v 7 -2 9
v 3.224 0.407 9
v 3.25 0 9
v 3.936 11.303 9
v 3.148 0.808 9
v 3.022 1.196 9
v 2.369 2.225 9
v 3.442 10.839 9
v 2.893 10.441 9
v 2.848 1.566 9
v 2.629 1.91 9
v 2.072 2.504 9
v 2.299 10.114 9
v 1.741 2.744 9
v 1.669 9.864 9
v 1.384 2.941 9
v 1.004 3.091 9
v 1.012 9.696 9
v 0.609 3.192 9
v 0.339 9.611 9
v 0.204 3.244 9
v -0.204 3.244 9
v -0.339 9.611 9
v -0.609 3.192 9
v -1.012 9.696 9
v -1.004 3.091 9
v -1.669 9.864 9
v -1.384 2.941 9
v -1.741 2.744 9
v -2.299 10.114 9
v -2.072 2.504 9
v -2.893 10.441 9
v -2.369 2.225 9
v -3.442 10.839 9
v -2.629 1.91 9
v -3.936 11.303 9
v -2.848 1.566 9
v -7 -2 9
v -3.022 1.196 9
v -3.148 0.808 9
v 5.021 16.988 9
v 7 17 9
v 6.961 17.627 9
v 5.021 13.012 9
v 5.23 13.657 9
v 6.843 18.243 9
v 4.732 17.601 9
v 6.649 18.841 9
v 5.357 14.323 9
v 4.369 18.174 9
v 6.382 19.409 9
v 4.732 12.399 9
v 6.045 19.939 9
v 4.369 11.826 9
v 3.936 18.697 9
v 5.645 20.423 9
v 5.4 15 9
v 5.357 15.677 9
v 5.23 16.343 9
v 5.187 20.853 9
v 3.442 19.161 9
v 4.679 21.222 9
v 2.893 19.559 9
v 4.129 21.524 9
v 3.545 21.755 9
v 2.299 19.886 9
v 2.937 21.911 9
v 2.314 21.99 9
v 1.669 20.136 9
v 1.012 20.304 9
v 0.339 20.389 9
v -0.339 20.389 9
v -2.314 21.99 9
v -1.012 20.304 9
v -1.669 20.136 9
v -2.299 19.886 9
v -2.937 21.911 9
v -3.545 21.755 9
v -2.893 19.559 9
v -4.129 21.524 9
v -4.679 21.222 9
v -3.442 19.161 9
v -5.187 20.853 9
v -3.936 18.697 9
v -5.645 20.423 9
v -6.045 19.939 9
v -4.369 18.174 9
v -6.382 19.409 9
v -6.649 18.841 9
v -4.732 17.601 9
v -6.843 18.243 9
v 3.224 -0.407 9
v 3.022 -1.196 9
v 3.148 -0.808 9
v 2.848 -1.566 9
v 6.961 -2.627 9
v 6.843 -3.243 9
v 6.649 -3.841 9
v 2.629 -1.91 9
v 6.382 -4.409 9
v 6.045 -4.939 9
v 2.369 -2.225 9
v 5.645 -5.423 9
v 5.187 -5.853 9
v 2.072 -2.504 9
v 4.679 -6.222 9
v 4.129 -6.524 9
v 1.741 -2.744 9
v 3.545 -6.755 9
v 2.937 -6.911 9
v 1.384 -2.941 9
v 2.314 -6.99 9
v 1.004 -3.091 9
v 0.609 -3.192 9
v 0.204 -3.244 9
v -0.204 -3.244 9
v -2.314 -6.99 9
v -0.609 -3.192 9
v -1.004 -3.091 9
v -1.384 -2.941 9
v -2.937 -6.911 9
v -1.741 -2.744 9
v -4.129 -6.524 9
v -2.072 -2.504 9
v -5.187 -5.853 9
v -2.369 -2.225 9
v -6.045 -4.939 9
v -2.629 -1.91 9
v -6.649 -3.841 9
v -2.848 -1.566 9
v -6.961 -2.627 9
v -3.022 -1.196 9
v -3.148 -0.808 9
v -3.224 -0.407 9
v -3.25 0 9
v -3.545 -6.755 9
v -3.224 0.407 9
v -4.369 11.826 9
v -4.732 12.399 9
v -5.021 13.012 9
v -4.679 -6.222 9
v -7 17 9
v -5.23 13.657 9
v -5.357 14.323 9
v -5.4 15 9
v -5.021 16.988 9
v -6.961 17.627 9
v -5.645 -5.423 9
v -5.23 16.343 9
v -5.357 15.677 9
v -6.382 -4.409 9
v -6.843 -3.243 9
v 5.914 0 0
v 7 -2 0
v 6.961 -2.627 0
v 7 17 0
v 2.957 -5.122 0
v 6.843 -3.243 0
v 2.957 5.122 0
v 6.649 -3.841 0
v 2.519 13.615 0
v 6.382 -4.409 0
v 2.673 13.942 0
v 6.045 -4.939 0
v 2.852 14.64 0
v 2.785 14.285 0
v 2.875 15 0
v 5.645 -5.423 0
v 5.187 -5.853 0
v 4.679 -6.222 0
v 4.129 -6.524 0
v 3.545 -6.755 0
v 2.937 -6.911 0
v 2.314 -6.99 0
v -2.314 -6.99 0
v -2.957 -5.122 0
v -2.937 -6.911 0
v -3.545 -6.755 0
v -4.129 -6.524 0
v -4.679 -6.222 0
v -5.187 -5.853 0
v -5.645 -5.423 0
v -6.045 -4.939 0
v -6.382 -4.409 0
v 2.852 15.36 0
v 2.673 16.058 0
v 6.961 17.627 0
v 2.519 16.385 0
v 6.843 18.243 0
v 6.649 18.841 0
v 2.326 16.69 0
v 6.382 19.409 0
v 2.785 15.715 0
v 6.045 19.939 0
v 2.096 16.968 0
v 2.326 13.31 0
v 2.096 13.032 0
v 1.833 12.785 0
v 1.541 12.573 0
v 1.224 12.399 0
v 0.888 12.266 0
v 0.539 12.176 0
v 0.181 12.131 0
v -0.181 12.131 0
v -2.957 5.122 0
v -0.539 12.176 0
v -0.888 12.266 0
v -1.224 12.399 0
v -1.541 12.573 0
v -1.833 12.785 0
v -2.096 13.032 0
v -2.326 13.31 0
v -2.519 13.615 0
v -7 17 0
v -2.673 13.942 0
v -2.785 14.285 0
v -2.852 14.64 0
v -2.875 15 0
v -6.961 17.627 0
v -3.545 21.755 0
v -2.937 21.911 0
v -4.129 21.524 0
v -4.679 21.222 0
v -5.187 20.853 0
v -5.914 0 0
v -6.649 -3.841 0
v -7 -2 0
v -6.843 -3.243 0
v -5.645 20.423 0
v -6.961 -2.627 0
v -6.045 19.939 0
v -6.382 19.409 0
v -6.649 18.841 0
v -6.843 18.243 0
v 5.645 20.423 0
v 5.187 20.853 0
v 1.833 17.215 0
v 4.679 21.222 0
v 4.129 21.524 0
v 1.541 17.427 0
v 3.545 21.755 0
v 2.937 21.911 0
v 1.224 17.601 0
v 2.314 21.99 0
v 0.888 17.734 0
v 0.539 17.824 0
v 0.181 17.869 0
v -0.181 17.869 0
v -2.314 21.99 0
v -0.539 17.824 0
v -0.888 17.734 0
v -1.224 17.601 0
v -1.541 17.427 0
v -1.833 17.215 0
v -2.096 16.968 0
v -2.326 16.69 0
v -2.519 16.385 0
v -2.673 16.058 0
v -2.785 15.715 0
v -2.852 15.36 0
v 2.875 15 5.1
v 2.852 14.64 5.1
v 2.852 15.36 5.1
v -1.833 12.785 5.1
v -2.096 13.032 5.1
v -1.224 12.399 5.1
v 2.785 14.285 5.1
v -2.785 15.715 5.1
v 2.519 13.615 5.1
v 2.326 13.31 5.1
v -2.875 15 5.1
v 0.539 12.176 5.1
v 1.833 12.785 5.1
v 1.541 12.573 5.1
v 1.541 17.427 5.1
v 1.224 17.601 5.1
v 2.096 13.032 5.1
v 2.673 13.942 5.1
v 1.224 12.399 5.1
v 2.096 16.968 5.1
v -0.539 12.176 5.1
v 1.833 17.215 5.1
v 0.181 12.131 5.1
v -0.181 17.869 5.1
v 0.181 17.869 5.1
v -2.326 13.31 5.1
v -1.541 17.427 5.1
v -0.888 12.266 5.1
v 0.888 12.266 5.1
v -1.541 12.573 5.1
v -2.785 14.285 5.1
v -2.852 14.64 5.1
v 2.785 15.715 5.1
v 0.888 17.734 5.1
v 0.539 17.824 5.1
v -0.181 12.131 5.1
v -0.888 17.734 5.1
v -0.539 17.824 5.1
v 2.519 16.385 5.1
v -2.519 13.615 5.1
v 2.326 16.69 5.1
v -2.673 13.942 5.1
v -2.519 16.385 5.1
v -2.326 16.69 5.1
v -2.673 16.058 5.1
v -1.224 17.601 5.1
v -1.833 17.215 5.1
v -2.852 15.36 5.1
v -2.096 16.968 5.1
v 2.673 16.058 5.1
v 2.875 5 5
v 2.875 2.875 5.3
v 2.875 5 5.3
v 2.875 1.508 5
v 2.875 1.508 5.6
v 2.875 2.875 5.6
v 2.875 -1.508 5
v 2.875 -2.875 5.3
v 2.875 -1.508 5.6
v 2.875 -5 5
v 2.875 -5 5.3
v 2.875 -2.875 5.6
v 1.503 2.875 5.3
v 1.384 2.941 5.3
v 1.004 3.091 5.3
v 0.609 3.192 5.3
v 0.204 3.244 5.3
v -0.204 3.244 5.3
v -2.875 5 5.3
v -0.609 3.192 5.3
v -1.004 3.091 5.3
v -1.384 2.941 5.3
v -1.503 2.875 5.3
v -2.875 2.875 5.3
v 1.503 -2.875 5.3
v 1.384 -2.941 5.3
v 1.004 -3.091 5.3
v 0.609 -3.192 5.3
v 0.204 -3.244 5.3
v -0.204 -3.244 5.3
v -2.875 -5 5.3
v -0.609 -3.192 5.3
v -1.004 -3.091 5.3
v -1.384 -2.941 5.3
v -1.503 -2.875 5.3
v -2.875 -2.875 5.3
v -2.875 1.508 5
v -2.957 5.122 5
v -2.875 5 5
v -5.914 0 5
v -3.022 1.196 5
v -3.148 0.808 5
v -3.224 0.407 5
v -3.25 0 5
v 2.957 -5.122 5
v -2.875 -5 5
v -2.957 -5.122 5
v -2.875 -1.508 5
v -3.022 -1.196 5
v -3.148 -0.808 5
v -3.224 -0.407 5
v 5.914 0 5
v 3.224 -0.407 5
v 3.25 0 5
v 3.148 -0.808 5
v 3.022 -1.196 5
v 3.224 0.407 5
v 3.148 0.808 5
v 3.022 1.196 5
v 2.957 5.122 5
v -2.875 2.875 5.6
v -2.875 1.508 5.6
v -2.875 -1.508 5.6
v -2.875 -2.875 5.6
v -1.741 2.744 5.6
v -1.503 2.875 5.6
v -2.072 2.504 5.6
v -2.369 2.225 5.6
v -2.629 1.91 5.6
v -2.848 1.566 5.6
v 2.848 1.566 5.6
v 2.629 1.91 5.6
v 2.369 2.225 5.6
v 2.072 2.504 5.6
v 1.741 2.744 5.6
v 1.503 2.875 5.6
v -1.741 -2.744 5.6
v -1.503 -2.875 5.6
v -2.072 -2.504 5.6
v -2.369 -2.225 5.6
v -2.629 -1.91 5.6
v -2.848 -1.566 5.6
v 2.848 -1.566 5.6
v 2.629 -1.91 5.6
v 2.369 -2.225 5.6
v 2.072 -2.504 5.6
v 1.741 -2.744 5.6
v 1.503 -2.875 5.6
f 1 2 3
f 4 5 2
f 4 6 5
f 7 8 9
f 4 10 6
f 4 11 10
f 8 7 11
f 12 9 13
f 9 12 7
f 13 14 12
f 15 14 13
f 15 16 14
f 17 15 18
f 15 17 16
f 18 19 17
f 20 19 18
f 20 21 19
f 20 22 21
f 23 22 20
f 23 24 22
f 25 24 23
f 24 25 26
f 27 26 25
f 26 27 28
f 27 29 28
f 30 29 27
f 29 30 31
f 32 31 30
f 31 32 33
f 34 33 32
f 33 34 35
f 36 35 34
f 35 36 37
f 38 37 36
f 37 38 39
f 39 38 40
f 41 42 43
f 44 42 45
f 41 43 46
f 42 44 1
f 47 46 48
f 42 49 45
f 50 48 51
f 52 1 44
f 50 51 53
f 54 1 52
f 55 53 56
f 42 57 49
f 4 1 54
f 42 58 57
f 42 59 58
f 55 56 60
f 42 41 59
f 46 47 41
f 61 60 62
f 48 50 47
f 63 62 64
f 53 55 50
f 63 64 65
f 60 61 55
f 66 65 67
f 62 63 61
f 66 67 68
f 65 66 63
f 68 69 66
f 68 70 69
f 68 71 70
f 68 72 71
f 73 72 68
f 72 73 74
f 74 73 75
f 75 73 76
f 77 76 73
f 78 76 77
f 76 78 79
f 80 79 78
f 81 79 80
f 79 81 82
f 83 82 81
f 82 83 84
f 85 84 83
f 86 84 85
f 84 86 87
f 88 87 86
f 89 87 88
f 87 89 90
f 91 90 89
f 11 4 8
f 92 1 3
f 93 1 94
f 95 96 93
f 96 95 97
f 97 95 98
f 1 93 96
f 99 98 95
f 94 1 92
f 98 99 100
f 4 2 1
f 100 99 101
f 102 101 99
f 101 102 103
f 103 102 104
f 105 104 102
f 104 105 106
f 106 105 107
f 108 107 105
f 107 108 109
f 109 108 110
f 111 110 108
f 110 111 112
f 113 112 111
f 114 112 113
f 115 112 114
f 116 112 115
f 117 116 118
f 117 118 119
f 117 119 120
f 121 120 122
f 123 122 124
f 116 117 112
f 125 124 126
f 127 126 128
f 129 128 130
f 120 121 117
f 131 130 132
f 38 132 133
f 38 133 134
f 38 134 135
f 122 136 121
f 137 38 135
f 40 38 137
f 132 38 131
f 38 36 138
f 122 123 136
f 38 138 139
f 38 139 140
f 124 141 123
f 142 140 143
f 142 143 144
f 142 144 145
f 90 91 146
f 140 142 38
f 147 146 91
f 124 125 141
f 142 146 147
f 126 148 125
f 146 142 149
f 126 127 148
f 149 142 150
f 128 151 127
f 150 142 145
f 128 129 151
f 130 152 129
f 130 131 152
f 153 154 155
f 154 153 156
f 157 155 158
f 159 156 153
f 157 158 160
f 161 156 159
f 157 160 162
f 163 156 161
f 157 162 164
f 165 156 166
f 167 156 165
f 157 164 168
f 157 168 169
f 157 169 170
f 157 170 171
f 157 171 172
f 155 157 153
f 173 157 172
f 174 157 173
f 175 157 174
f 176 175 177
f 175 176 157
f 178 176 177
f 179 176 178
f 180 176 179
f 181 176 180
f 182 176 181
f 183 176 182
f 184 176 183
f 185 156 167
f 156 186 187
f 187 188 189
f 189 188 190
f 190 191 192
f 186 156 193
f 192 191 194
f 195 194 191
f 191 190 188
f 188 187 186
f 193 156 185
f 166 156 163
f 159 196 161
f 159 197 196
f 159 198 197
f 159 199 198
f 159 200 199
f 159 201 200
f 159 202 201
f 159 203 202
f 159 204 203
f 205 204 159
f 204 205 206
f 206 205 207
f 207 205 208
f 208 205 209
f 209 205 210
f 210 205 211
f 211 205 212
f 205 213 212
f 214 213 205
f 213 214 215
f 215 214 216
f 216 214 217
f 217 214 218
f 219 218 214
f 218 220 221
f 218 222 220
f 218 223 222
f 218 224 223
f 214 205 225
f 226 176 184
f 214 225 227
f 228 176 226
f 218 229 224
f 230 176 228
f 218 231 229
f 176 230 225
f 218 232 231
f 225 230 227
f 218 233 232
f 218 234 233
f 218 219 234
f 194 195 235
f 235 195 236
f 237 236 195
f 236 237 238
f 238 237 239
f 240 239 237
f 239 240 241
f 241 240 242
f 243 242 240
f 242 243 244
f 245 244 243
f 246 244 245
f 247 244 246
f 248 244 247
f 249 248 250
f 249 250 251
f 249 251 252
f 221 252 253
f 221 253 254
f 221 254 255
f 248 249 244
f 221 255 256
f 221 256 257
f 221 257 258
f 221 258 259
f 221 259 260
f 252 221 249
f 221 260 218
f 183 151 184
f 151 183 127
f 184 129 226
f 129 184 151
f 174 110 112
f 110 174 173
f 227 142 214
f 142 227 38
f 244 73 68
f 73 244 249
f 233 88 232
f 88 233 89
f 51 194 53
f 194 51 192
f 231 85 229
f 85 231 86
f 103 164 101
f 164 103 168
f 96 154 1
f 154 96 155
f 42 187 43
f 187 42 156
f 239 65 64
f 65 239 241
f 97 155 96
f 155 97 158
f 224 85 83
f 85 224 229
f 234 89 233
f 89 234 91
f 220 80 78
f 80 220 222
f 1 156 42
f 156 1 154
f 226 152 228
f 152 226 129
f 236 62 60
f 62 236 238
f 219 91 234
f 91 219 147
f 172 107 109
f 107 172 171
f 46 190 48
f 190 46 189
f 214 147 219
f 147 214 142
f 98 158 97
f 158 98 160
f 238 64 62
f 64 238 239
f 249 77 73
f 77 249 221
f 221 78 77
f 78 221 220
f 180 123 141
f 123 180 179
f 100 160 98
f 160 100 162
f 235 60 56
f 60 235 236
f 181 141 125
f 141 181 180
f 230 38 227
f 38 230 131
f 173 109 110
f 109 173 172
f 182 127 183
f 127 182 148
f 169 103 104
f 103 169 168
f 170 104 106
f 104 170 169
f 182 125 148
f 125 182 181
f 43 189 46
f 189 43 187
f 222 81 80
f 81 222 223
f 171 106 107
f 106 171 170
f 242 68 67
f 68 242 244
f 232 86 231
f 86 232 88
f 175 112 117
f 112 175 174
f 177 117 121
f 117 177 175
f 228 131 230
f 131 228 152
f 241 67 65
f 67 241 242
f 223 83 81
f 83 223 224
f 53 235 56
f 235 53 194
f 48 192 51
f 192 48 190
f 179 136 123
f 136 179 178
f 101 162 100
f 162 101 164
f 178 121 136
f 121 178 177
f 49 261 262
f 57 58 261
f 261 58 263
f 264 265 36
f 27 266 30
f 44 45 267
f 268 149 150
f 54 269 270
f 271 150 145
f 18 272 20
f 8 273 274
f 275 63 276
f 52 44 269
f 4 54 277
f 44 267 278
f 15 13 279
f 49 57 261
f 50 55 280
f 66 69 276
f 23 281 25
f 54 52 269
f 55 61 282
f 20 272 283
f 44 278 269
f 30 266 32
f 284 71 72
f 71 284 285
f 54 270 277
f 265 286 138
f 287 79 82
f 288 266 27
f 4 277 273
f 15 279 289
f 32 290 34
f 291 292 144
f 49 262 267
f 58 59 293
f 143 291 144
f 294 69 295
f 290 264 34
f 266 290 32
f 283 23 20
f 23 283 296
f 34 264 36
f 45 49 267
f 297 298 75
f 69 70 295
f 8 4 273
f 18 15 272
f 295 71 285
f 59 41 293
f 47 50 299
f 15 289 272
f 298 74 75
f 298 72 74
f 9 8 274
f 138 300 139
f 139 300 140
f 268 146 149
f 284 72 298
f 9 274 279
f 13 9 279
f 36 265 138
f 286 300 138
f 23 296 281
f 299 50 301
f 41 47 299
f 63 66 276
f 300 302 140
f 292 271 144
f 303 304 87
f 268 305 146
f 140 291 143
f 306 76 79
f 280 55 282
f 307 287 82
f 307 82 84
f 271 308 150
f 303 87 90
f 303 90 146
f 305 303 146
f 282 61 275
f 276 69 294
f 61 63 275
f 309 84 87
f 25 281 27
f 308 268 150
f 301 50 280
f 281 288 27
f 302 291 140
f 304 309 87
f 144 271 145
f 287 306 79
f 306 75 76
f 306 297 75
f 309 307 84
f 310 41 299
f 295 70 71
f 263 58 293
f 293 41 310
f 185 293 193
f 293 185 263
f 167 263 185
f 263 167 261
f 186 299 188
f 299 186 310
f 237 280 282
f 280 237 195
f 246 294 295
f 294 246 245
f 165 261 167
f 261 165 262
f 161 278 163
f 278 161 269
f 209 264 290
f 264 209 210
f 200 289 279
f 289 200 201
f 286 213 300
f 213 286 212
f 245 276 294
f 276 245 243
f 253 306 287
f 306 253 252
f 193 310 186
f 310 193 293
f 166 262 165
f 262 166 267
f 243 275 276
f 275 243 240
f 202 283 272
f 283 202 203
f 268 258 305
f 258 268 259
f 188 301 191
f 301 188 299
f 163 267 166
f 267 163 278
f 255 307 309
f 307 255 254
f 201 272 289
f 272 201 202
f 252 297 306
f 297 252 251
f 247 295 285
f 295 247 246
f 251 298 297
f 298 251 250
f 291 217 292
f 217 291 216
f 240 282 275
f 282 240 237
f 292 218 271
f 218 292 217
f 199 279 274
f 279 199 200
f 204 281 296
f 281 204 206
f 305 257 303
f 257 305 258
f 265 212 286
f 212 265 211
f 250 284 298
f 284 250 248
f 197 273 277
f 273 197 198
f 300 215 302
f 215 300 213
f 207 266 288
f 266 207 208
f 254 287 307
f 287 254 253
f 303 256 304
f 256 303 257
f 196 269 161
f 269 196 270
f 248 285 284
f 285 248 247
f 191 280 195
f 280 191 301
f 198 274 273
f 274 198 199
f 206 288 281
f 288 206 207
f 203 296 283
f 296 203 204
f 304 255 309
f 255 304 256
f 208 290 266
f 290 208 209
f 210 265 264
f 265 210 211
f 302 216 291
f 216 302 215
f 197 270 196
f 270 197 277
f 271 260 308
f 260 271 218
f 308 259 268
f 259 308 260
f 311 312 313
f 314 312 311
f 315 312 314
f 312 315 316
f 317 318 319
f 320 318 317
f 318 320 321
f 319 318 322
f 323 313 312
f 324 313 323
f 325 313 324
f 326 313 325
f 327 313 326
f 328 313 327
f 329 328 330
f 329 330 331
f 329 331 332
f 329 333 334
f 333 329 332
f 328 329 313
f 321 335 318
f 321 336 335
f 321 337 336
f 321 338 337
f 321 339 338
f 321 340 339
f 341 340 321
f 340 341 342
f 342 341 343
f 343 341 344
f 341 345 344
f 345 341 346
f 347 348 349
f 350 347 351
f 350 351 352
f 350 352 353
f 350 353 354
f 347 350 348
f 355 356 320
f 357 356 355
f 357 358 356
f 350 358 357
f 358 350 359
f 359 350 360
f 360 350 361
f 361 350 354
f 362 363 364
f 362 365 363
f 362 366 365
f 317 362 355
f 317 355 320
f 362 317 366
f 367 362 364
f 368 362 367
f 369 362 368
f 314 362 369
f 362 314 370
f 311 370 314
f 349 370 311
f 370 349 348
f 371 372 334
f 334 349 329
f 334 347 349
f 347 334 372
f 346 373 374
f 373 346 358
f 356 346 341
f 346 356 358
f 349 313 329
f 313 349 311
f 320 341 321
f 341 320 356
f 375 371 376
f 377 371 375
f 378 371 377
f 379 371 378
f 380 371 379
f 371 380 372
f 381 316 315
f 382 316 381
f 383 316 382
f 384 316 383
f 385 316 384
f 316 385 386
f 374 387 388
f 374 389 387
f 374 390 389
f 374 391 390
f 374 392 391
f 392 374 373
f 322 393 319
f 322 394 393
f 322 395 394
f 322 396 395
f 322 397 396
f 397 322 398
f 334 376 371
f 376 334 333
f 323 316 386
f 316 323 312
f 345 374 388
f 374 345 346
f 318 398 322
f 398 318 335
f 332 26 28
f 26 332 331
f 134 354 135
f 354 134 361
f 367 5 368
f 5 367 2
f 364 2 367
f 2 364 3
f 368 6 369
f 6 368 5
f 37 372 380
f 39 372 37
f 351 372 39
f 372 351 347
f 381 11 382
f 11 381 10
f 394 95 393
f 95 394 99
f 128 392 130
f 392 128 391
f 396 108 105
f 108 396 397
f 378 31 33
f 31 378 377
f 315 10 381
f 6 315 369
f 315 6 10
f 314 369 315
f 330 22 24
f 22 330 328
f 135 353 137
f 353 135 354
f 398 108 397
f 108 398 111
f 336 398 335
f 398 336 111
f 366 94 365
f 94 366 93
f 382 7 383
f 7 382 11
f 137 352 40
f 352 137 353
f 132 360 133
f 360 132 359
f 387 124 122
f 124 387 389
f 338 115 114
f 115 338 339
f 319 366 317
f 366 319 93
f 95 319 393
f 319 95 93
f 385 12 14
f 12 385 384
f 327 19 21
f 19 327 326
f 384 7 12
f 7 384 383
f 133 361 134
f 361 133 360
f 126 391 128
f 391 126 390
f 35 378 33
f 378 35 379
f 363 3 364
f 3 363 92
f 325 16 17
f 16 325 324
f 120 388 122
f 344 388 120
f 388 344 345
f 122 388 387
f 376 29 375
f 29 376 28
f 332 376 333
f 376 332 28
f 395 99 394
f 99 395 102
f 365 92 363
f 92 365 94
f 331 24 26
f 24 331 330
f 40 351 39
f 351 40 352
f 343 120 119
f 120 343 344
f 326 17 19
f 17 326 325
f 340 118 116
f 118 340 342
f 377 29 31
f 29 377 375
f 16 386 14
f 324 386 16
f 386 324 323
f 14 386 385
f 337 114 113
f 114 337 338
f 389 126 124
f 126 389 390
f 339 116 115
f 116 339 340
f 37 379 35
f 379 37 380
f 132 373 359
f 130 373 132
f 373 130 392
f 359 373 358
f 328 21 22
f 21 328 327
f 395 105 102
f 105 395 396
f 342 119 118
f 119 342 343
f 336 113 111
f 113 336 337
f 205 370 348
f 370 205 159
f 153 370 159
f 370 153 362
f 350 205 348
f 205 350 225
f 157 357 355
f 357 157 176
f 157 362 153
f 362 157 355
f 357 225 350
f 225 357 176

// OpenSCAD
$fn = 50;


difference() {
	union() {
		cylinder(h = 9, r = 7.0000000000);
		translate(v = [0.0000000000, 7.5000000000, 0]) {
			hull() {
				translate(v = [-2.0000000000, 9.5000000000, 0]) {
					cylinder(h = 9, r = 5);
				}
				translate(v = [2.0000000000, 9.5000000000, 0]) {
					cylinder(h = 9, r = 5);
				}
				translate(v = [-2.0000000000, -9.5000000000, 0]) {
					cylinder(h = 9, r = 5);
				}
				translate(v = [2.0000000000, -9.5000000000, 0]) {
					cylinder(h = 9, r = 5);
				}
			}
		}
		translate(v = [0.0000000000, 7.5000000000, 0]) {
			hull() {
				translate(v = [-2.0000000000, 9.5000000000, 0]) {
					cylinder(h = 9, r = 5);
				}
				translate(v = [2.0000000000, 9.5000000000, 0]) {
					cylinder(h = 9, r = 5);
				}
				translate(v = [-2.0000000000, -9.5000000000, 0]) {
					cylinder(h = 9, r = 5);
				}
				translate(v = [2.0000000000, -9.5000000000, 0]) {
					cylinder(h = 9, r = 5);
				}
			}
		}
	}
	union() {
		translate(v = [0.0000000000, 15.0000000000, 9]) {
			rotate(a = [0, 0, 0]) {
				difference() {
					union() {
						#translate(v = [0, 0, -9.0000000000]) {
							cylinder(h = 9, r = 2.6000000000);
						}
						#translate(v = [0, 0, -3.9000000000]) {
							cylinder(h = 3.9000000000, r1 = 2.8750000000, r2 = 5.4000000000);
						}
						#translate(v = [0, 0, -9.0000000000]) {
							cylinder(h = 9, r = 2.8750000000);
						}
						#translate(v = [0, 0, -9.0000000000]) {
							cylinder(h = 9, r = 2.6000000000);
						}
					}
					union();
				}
			}
		}
		translate(v = [0.0000000000, 15.0000000000, 9]) {
			rotate(a = [0, 0, 0]) {
				difference() {
					union() {
						#translate(v = [0, 0, -9.0000000000]) {
							cylinder(h = 9, r = 2.6000000000);
						}
						#translate(v = [0, 0, -3.9000000000]) {
							cylinder(h = 3.9000000000, r1 = 2.8750000000, r2 = 5.4000000000);
						}
						#translate(v = [0, 0, -9.0000000000]) {
							cylinder(h = 9, r = 2.8750000000);
						}
						#translate(v = [0, 0, -9.0000000000]) {
							cylinder(h = 9, r = 2.6000000000);
						}
					}
					union();
				}
			}
		}
		translate(v = [0.0000000000, 0.0000000000, 0]) {
			rotate(a = [0, 0, 0]) {
				difference() {
					union() {
						#translate(v = [-2.8750000000, -5.0000000000, -0.3000000000]) {
							cube(size = [5.7500000000, 10, 0.3000000000]);
						}
						#translate(v = [-2.8750000000, -2.8750000000, -0.6000000000]) {
							cube(size = [5.7500000000, 5.7500000000, 0.3000000000]);
						}
						#translate(v = [-2.8750000000, -5.0000000000, 5]) {
							cube(size = [5.7500000000, 10, 0.3000000000]);
						}
						#translate(v = [-2.8750000000, -2.8750000000, 5.3000000000]) {
							cube(size = [5.7500000000, 5.7500000000, 0.3000000000]);
						}
						#translate(v = [0, 0, -100.0000000000]) {
							cylinder(h = 200, r = 3.2500000000);
						}
						#linear_extrude(height = 5) {
							polygon(points = [[5.9142500000, 0.0000000000], [2.9571250000, 5.1218907443], [-2.9571250000, 5.1218907443], [-5.9142500000, 0.0000000000], [-2.9571250000, -5.1218907443], [2.9571250000, -5.1218907443]]);
						}
						#translate(v = [-2.8750000000, -5.0000000000, -0.3000000000]) {
							cube(size = [5.7500000000, 10, 0.3000000000]);
						}
						#translate(v = [-2.8750000000, -2.8750000000, -0.6000000000]) {
							cube(size = [5.7500000000, 5.7500000000, 0.3000000000]);
						}
						#translate(v = [-2.8750000000, -5.0000000000, 5]) {
							cube(size = [5.7500000000, 10, 0.3000000000]);
						}
						#translate(v = [-2.8750000000, -2.8750000000, 5.3000000000]) {
							cube(size = [5.7500000000, 5.7500000000, 0.3000000000]);
						}
						#translate(v = [0, 0, -100.0000000000]) {
							cylinder(h = 200, r = 3.2500000000);
						}
						#translate(v = [-2.8750000000, -5.0000000000, -0.3000000000]) {
							cube(size = [5.7500000000, 10, 0.3000000000]);
						}
						#translate(v = [-2.8750000000, -2.8750000000, -0.6000000000]) {
							cube(size = [5.7500000000, 5.7500000000, 0.3000000000]);
						}
						#translate(v = [-2.8750000000, -5.0000000000, 5]) {
							cube(size = [5.7500000000, 10, 0.3000000000]);
						}
						#translate(v = [-2.8750000000, -2.8750000000, 5.3000000000]) {
							cube(size = [5.7500000000, 5.7500000000, 0.3000000000]);
						}
						#translate(v = [0, 0, -100.0000000000]) {
							cylinder(h = 200, r = 3.2500000000);
						}
					}
					union();
				}
			}
		}
		translate(v = [0, 0, -100]) {
			cylinder(h = 200, r = 3.2500000000);
		}
		translate(v = [0, 0, -100]) {
			cylinder(h = 200, r = 1.8000000000);
		}
	}
}
